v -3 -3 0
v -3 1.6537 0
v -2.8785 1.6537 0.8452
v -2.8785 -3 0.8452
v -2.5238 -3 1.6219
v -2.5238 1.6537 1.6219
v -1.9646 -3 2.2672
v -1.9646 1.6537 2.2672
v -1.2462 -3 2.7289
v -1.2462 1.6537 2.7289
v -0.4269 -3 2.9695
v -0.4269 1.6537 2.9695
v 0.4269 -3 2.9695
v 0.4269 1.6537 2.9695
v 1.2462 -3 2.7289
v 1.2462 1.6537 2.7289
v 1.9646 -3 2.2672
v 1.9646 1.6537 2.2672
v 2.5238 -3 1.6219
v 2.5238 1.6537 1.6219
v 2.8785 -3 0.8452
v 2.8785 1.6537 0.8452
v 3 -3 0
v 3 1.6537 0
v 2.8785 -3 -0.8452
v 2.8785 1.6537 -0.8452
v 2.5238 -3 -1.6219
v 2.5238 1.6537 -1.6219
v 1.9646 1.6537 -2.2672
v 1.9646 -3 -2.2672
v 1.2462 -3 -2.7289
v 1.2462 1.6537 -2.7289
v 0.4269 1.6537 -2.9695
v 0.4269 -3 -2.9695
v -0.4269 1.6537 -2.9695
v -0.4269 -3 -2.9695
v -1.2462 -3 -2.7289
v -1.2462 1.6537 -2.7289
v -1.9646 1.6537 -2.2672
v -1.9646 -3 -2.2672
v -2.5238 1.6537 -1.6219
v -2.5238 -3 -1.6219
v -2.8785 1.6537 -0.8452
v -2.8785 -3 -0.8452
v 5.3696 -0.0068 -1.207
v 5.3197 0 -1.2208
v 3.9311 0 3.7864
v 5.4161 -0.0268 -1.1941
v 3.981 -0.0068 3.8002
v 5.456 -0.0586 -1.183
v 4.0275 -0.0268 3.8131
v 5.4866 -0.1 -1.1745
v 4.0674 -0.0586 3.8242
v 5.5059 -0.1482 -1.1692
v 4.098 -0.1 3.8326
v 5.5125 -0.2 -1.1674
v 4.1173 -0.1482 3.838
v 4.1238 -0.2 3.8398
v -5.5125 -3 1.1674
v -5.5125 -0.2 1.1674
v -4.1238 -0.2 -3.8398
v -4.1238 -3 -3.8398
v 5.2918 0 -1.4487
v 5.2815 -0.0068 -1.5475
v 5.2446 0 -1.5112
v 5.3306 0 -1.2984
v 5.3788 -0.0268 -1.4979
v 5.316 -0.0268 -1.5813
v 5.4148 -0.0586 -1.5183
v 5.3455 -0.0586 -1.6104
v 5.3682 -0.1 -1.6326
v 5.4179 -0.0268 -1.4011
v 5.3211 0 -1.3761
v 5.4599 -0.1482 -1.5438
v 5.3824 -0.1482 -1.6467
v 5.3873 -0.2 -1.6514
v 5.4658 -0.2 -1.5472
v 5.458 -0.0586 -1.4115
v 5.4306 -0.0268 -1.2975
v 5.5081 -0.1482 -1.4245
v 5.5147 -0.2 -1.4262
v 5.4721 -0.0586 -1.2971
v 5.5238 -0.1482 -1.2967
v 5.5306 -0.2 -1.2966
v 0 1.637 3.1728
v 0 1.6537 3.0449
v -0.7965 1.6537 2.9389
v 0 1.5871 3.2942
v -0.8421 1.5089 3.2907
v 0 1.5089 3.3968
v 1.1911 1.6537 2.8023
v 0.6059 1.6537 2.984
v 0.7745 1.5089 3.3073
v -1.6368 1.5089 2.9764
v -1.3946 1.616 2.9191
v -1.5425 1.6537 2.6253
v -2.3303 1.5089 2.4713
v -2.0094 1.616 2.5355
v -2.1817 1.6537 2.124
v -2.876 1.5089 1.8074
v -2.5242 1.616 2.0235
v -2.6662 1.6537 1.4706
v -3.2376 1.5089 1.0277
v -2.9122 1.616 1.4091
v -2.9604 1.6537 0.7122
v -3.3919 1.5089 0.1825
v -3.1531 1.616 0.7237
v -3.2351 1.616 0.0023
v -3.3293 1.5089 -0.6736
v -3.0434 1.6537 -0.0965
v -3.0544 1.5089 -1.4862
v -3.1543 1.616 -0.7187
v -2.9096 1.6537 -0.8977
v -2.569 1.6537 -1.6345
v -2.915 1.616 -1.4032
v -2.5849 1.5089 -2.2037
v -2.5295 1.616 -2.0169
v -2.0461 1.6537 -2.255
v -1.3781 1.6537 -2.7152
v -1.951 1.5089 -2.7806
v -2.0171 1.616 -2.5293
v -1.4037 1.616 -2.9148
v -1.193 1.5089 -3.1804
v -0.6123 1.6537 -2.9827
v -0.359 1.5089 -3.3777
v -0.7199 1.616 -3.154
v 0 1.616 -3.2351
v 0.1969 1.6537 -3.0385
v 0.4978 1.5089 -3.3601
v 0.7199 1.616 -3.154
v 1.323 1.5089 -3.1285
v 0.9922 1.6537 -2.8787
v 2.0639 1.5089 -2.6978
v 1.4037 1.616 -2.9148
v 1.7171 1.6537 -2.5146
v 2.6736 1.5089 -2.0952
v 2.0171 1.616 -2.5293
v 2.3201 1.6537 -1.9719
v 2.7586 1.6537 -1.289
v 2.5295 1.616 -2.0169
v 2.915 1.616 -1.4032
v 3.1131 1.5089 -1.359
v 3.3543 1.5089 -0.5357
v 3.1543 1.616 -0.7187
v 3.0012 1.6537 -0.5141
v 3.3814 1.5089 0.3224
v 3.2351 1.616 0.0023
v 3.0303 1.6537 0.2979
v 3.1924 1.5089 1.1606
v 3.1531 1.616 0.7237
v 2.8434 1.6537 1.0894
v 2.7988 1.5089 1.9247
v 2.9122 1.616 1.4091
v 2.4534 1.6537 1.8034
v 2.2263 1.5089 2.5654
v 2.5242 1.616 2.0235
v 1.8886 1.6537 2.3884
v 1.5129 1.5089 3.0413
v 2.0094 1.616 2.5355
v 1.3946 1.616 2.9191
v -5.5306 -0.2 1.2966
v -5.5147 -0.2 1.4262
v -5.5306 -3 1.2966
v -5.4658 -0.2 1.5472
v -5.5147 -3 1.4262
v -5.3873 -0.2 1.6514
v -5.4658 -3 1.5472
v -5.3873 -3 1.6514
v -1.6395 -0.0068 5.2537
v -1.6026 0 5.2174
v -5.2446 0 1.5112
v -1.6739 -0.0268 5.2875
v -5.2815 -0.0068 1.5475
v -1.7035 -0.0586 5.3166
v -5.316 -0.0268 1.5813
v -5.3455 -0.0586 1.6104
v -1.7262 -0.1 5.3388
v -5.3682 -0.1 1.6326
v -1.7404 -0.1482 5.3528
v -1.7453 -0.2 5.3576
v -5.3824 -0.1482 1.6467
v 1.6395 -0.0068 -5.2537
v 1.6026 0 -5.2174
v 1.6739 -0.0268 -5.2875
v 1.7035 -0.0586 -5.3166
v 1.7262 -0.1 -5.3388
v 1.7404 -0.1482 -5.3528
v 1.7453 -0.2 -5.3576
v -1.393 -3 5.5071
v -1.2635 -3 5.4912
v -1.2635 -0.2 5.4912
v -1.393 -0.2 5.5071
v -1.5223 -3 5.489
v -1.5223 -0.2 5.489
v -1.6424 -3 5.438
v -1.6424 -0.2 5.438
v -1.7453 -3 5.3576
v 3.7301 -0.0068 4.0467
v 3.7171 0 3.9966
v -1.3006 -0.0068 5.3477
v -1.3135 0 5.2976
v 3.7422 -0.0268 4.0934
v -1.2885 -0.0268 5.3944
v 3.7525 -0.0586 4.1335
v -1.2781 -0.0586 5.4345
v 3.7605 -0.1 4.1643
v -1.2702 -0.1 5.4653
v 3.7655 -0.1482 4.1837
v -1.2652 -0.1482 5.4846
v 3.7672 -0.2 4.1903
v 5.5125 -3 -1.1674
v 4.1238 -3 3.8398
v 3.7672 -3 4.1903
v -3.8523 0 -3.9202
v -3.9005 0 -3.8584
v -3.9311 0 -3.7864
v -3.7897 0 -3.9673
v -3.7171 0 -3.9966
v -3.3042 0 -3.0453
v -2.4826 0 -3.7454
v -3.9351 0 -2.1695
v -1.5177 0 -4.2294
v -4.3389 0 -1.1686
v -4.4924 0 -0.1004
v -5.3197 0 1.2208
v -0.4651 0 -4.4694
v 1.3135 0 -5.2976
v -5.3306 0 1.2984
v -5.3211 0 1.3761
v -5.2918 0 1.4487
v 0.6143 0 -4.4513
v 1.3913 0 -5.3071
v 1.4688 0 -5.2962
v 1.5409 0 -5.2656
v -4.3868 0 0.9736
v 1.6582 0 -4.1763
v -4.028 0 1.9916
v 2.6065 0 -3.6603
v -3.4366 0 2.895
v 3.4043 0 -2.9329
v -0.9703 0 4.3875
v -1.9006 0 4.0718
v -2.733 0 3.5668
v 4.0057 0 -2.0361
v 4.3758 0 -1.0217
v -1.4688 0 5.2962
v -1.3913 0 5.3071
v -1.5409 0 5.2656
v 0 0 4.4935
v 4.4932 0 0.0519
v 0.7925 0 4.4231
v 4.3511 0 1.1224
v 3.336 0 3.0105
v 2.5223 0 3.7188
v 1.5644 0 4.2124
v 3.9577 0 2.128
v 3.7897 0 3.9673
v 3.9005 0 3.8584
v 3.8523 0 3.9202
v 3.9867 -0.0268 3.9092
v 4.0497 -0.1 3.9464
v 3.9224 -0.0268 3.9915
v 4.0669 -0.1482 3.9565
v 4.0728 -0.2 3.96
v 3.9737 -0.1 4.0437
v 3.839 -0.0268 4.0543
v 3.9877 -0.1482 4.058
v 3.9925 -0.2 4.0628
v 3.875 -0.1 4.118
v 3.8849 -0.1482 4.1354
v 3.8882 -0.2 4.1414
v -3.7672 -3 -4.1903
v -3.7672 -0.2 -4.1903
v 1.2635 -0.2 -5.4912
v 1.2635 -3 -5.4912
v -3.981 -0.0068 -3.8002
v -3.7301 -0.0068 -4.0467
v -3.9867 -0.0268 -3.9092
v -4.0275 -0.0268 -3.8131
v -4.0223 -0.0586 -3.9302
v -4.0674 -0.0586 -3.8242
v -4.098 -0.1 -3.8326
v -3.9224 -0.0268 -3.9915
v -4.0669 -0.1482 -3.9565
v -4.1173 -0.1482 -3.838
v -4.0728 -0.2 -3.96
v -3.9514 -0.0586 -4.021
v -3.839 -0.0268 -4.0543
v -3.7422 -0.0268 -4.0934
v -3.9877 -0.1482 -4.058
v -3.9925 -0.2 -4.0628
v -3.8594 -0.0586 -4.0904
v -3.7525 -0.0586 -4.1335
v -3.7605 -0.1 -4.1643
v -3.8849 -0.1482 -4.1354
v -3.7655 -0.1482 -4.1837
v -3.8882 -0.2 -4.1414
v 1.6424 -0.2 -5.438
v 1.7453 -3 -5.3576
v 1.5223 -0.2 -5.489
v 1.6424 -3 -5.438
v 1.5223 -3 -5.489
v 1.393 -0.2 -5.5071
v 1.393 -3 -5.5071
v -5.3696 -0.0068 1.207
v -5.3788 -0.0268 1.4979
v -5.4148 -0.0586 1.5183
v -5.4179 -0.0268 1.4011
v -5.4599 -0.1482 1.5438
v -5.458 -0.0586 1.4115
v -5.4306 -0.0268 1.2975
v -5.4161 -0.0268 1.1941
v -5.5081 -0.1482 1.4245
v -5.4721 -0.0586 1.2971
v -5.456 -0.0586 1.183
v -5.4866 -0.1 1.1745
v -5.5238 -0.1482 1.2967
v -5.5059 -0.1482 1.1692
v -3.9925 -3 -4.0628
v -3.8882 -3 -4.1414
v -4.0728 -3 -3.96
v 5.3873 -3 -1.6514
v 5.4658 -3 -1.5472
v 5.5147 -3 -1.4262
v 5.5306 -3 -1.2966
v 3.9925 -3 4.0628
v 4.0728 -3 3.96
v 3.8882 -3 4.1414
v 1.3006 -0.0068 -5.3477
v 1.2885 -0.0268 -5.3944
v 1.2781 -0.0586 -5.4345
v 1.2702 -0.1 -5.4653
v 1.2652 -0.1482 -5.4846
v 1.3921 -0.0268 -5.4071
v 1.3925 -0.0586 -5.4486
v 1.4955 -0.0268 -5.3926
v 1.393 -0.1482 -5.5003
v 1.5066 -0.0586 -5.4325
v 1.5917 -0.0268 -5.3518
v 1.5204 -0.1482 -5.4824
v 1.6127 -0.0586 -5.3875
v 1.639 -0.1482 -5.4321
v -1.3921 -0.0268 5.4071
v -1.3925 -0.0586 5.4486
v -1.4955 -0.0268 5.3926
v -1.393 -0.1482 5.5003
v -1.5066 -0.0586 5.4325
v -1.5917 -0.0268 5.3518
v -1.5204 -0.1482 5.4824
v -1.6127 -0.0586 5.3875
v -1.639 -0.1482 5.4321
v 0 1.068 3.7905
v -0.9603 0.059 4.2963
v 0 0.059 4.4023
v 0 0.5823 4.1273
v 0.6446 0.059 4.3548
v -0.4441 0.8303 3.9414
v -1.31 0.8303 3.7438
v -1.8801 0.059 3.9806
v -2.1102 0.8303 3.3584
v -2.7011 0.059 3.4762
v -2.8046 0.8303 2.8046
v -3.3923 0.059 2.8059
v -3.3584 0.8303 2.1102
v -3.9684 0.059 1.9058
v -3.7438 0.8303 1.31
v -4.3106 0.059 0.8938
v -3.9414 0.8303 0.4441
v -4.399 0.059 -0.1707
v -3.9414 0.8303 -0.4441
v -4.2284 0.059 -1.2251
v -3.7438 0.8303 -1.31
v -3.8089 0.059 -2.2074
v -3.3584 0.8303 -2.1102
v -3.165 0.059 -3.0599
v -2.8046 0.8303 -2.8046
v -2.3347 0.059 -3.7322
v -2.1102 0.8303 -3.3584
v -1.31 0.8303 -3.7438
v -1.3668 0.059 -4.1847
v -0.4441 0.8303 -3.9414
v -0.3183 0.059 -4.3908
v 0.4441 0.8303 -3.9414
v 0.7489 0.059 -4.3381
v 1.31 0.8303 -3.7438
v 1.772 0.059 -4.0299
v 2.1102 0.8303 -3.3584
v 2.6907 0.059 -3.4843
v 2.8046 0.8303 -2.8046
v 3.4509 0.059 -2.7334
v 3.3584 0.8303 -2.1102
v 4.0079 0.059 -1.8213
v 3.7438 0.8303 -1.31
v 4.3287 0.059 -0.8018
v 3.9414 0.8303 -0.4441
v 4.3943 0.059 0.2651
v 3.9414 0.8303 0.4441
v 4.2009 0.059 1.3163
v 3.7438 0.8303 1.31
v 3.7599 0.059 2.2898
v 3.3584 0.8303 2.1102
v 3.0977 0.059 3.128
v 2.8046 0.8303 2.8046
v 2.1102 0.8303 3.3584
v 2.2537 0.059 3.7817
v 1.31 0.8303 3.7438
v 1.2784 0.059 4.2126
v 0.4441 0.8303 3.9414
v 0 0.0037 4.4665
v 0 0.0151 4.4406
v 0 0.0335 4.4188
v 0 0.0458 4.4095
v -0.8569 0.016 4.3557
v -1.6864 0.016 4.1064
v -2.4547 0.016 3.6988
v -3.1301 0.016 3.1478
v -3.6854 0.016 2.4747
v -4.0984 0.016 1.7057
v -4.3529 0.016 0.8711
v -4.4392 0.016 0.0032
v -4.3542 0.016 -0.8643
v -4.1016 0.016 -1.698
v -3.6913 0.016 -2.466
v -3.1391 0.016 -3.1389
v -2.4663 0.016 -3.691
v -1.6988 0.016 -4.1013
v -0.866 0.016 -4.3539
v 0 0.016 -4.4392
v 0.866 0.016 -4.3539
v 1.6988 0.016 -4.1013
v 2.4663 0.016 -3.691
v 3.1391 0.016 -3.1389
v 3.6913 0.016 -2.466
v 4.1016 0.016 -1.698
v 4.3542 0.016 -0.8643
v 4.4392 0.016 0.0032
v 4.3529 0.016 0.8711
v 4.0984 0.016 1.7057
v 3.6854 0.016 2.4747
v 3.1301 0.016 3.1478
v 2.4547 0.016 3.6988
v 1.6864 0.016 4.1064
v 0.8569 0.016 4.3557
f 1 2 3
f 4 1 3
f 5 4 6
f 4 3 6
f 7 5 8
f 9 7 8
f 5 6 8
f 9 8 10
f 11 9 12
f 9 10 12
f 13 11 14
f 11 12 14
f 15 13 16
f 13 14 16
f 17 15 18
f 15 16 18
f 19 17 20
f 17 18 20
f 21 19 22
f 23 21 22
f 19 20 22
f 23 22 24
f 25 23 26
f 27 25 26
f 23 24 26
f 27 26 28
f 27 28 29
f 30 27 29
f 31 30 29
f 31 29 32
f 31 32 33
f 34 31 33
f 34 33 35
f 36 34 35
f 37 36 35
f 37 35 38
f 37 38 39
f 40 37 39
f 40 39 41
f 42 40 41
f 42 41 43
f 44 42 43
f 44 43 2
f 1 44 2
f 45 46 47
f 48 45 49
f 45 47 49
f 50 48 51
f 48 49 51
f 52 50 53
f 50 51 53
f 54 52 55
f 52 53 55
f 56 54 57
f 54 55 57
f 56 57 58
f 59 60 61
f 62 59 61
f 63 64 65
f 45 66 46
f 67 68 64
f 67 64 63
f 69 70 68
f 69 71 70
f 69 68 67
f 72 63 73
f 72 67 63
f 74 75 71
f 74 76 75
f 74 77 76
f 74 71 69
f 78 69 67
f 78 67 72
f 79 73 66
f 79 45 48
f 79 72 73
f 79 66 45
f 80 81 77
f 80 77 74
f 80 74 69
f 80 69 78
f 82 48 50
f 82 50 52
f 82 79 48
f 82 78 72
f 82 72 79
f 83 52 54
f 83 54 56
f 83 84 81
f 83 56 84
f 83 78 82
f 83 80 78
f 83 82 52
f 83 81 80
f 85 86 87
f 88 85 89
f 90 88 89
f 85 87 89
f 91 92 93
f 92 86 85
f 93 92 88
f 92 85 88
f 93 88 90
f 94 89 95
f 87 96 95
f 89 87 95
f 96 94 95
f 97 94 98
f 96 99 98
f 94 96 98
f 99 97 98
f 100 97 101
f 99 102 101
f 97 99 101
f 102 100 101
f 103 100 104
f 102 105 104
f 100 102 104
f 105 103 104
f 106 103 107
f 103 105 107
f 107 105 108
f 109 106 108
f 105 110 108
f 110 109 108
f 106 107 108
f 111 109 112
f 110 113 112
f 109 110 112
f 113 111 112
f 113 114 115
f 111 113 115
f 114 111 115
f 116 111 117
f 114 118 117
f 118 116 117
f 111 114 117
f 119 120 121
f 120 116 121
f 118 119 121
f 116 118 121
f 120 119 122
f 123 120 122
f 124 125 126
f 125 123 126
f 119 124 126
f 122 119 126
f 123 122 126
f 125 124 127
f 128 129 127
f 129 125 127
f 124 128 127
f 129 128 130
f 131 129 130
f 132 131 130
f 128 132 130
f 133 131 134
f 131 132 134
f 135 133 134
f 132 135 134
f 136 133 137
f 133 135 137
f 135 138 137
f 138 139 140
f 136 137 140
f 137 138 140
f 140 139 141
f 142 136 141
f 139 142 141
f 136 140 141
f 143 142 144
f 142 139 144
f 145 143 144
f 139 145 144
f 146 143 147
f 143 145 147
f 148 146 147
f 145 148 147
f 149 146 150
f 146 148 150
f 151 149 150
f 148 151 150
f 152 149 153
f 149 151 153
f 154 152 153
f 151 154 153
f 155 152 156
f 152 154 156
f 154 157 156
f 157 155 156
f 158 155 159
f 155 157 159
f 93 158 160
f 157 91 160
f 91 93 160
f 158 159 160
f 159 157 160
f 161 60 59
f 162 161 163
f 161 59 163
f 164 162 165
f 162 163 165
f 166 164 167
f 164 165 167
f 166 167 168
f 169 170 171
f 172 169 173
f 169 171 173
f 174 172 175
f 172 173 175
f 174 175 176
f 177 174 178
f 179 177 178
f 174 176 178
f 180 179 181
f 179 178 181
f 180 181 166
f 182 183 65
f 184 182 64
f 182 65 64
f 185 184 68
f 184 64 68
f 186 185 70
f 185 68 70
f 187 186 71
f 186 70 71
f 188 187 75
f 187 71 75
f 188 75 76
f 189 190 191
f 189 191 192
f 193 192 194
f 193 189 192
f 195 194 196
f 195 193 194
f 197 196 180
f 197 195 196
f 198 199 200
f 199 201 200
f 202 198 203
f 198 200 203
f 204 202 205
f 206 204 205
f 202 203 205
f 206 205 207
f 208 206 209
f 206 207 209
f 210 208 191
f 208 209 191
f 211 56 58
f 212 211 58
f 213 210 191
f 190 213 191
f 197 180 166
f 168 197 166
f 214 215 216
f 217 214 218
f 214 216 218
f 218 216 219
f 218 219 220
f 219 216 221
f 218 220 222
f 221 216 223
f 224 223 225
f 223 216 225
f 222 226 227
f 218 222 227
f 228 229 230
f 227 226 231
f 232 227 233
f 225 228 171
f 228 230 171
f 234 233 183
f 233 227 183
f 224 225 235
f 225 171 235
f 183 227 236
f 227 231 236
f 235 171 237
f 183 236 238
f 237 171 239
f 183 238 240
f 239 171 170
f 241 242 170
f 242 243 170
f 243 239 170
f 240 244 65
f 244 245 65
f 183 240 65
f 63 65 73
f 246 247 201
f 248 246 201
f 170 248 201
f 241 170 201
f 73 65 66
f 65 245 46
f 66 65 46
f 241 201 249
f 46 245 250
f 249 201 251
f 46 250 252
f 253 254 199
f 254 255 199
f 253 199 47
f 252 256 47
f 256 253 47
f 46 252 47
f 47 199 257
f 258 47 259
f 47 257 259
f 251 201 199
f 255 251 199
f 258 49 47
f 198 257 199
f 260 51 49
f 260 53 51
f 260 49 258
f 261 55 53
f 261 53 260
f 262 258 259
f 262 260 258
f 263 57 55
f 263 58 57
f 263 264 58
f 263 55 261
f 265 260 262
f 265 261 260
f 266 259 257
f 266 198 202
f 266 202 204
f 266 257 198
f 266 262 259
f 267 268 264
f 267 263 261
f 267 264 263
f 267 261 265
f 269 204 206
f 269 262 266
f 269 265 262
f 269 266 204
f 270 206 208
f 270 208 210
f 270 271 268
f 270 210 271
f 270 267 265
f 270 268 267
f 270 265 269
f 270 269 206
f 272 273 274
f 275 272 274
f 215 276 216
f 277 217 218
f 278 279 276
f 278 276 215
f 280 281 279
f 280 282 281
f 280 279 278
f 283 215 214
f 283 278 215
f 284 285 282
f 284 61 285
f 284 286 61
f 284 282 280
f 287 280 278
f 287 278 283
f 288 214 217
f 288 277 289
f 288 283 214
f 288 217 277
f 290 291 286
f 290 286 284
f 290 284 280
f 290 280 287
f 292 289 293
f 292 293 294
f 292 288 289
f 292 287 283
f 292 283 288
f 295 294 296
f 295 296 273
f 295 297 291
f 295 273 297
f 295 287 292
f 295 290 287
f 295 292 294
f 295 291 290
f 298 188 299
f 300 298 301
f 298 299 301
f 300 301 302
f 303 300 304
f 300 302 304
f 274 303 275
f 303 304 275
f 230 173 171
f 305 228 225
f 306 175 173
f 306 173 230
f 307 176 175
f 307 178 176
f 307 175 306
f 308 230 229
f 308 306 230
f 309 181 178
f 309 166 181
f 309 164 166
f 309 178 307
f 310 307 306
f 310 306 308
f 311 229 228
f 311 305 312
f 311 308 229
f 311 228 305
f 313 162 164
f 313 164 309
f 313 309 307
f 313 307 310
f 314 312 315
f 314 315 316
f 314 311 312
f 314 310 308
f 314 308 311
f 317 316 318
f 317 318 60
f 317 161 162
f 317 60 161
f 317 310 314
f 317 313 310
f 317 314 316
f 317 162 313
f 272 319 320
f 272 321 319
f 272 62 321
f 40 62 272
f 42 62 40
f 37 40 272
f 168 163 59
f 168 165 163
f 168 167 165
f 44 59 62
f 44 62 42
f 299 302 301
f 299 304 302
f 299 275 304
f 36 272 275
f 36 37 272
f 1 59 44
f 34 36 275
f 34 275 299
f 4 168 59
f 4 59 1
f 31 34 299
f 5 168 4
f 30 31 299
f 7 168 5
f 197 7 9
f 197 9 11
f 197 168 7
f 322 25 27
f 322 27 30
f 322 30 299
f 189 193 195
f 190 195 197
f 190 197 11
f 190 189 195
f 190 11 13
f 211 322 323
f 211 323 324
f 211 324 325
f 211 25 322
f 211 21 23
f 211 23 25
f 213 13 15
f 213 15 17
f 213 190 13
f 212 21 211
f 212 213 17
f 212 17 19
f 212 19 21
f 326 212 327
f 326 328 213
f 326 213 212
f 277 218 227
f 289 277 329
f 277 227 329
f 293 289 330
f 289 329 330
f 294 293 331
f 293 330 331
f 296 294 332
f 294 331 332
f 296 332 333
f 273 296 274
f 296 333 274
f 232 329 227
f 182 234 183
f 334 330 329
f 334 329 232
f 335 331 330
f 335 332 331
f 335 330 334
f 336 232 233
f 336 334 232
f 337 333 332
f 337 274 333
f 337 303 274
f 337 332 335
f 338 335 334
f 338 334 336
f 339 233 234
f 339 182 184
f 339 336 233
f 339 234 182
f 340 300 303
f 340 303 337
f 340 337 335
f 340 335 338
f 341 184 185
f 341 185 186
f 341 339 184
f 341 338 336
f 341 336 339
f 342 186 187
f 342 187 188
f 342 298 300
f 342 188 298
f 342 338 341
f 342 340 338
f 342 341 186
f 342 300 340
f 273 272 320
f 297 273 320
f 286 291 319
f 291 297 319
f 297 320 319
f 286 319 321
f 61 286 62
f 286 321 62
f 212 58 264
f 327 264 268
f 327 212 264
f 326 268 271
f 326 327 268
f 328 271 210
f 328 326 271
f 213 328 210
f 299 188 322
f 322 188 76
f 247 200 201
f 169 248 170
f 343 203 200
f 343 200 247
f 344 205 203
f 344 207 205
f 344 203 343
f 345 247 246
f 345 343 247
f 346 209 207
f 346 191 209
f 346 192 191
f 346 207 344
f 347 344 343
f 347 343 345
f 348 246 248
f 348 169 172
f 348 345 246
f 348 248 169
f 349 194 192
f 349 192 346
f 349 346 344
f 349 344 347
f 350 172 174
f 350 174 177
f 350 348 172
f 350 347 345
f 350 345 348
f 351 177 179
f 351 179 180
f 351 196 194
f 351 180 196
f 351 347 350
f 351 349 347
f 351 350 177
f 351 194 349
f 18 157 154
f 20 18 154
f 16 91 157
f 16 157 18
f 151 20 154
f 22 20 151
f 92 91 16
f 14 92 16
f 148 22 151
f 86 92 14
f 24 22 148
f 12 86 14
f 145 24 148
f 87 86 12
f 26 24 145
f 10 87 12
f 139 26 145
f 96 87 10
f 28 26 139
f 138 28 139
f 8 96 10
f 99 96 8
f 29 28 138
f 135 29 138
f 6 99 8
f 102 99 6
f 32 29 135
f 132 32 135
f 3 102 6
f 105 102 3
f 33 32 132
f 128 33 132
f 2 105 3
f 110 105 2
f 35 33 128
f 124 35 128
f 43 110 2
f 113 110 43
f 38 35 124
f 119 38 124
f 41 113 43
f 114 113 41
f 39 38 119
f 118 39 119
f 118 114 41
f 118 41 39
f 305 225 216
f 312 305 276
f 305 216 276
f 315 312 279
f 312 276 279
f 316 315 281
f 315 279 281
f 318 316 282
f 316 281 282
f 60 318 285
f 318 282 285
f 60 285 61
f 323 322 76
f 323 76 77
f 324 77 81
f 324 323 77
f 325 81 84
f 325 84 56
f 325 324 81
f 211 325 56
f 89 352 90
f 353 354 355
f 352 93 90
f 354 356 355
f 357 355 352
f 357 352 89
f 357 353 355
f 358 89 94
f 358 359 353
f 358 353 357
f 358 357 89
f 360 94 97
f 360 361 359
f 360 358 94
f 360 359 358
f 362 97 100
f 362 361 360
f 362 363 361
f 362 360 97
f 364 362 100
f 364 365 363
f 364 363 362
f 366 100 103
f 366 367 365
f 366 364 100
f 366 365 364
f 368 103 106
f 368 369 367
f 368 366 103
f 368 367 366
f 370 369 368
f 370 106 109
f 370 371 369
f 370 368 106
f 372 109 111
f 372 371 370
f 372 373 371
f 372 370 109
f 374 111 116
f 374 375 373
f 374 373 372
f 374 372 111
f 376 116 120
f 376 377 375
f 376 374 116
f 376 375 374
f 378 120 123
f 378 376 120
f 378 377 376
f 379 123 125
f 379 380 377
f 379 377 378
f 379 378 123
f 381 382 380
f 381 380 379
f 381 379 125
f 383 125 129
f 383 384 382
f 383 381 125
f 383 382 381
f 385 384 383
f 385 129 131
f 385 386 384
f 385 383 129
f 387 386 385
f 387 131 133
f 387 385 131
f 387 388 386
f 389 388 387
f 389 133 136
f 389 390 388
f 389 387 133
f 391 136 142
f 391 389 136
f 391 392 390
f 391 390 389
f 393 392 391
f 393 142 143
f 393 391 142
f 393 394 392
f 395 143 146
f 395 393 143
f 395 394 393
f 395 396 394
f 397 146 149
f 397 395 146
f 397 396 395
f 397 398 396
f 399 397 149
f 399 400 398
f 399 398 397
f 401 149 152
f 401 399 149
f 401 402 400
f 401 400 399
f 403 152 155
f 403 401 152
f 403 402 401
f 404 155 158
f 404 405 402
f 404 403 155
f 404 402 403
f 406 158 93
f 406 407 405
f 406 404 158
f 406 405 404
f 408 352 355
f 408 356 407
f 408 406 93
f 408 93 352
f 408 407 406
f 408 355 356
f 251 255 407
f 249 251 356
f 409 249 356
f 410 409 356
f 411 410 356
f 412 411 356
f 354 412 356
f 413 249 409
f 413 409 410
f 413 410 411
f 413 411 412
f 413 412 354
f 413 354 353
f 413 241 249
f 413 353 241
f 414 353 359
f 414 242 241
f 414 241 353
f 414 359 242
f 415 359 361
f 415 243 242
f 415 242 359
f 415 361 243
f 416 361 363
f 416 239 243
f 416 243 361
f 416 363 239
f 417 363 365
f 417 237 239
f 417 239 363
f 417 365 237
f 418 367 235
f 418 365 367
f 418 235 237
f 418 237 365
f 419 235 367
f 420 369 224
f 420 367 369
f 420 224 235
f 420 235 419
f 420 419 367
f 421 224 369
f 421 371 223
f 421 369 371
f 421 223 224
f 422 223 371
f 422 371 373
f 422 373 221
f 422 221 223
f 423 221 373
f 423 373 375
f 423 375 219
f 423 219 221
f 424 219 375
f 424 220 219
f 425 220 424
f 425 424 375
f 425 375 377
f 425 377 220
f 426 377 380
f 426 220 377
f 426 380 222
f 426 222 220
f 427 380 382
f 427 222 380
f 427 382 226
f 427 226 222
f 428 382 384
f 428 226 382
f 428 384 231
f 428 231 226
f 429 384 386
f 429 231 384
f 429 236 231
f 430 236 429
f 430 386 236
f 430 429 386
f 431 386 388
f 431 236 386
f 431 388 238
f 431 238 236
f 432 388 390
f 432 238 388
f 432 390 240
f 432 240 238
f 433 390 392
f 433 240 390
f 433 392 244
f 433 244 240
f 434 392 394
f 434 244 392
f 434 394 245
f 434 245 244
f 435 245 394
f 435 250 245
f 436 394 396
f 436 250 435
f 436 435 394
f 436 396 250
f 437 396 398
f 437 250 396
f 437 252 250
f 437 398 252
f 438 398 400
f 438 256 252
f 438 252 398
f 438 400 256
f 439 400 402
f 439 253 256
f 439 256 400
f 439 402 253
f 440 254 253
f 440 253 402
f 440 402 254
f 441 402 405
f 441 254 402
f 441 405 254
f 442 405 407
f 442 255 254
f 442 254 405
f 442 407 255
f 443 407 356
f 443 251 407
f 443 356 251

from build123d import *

# Parameters (mm, degrees)
F1_DEPTH = 3
F4_R     = 0.5
F6_R     = 0.1
F7_R     = 3
F8_DEPTH = 25
F9_R     = 0.5
F10_R    = 0.2


with BuildPart() as f1:
    # F0 (on Front) → F1 (new body)
    with BuildSketch(Plane.XZ):
        Polygon((1.542941519, -5.5635119126), (5.5896134101, -1.4455294043), (4.0466718911, 4.1179825084), (-1.542941519, 5.5635119126), (-5.5896134101, 1.4455294043), (-4.0466718911, -4.1179825084), align=None)
    extrude(amount=F1_DEPTH)


with BuildPart() as f3:
    # F2 (on Right) → F3 (revolve)
    with BuildSketch(Plane.YZ):
        with BuildLine():
            Line((1.653650824, 0), (1.653650824, 3.2440995908))
            ThreePointArc((1.653650824, 3.2440995908), (0.8126995328, 3.9784778483), (-0.1744808685, 4.5))
            Line((-0.1744808685, 4.5), (-0.1744808685, 0))
            Line((-0.1744808685, 0), (1.653650824, 0))
        make_face()
    revolve(axis=Axis((0, -1.6547753563, 0), (0, -1, 0)))

    # F4
    f4_edges = [f3.edges().sort_by_distance(p)[0] for p in [
        (0, 1.653651, -3.2441),
    ]]
    fillet(f4_edges, radius=F4_R)

    # F5: union F1
    add(f1.part)

    # F6
    f6_edges = [f3.edges().sort_by_distance(p)[0] for p in [
        (0, 0, -4.428349),
    ]]
    fillet(f6_edges, radius=F6_R)

    # F7 (on face) → F8 (cut)
    with BuildSketch(Plane(origin=(0, 1.653650824, 0), x_dir=(-1, 0, 0), z_dir=(0, 1, 0))):
        Circle(F7_R)
    extrude(amount=-F8_DEPTH, mode=Mode.SUBTRACT)

    # F9
    f9_edges = [f3.edges().sort_by_distance(p)[0] for p in [
        (-5.589613, -1.5, 1.445529),
        (-4.046672, -1.5, -4.117983),
        (1.542942, -1.5, -5.563512),
        (-1.542942, -1.5, 5.563512),
        (5.589613, -1.5, -1.445529),
        (4.046672, -1.5, 4.117983),
    ]]
    fillet(f9_edges, radius=F9_R)

    # F10
    f10_edges = [f3.edges().sort_by_distance(p)[0] for p in [
        (1.251865, 0, 4.840747),
        (4.818143, 0, 1.336227),
        (5.514727, 0, -1.426163),
        (3.992457, 0, 4.062812),
        (3.566277, 0, -3.504521),
        (1.52227, 0, -5.488975),
        (-1.251865, 0, -4.840747),
        (-3.992457, 0, -4.062812),
        (-4.818143, 0, -1.336227),
        (-5.514727, 0, 1.426163),
        (-3.566277, 0, 3.504521),
        (-1.52227, 0, 5.488975),
    ]]
    fillet(f10_edges, radius=F10_R)


solid = f3.part
